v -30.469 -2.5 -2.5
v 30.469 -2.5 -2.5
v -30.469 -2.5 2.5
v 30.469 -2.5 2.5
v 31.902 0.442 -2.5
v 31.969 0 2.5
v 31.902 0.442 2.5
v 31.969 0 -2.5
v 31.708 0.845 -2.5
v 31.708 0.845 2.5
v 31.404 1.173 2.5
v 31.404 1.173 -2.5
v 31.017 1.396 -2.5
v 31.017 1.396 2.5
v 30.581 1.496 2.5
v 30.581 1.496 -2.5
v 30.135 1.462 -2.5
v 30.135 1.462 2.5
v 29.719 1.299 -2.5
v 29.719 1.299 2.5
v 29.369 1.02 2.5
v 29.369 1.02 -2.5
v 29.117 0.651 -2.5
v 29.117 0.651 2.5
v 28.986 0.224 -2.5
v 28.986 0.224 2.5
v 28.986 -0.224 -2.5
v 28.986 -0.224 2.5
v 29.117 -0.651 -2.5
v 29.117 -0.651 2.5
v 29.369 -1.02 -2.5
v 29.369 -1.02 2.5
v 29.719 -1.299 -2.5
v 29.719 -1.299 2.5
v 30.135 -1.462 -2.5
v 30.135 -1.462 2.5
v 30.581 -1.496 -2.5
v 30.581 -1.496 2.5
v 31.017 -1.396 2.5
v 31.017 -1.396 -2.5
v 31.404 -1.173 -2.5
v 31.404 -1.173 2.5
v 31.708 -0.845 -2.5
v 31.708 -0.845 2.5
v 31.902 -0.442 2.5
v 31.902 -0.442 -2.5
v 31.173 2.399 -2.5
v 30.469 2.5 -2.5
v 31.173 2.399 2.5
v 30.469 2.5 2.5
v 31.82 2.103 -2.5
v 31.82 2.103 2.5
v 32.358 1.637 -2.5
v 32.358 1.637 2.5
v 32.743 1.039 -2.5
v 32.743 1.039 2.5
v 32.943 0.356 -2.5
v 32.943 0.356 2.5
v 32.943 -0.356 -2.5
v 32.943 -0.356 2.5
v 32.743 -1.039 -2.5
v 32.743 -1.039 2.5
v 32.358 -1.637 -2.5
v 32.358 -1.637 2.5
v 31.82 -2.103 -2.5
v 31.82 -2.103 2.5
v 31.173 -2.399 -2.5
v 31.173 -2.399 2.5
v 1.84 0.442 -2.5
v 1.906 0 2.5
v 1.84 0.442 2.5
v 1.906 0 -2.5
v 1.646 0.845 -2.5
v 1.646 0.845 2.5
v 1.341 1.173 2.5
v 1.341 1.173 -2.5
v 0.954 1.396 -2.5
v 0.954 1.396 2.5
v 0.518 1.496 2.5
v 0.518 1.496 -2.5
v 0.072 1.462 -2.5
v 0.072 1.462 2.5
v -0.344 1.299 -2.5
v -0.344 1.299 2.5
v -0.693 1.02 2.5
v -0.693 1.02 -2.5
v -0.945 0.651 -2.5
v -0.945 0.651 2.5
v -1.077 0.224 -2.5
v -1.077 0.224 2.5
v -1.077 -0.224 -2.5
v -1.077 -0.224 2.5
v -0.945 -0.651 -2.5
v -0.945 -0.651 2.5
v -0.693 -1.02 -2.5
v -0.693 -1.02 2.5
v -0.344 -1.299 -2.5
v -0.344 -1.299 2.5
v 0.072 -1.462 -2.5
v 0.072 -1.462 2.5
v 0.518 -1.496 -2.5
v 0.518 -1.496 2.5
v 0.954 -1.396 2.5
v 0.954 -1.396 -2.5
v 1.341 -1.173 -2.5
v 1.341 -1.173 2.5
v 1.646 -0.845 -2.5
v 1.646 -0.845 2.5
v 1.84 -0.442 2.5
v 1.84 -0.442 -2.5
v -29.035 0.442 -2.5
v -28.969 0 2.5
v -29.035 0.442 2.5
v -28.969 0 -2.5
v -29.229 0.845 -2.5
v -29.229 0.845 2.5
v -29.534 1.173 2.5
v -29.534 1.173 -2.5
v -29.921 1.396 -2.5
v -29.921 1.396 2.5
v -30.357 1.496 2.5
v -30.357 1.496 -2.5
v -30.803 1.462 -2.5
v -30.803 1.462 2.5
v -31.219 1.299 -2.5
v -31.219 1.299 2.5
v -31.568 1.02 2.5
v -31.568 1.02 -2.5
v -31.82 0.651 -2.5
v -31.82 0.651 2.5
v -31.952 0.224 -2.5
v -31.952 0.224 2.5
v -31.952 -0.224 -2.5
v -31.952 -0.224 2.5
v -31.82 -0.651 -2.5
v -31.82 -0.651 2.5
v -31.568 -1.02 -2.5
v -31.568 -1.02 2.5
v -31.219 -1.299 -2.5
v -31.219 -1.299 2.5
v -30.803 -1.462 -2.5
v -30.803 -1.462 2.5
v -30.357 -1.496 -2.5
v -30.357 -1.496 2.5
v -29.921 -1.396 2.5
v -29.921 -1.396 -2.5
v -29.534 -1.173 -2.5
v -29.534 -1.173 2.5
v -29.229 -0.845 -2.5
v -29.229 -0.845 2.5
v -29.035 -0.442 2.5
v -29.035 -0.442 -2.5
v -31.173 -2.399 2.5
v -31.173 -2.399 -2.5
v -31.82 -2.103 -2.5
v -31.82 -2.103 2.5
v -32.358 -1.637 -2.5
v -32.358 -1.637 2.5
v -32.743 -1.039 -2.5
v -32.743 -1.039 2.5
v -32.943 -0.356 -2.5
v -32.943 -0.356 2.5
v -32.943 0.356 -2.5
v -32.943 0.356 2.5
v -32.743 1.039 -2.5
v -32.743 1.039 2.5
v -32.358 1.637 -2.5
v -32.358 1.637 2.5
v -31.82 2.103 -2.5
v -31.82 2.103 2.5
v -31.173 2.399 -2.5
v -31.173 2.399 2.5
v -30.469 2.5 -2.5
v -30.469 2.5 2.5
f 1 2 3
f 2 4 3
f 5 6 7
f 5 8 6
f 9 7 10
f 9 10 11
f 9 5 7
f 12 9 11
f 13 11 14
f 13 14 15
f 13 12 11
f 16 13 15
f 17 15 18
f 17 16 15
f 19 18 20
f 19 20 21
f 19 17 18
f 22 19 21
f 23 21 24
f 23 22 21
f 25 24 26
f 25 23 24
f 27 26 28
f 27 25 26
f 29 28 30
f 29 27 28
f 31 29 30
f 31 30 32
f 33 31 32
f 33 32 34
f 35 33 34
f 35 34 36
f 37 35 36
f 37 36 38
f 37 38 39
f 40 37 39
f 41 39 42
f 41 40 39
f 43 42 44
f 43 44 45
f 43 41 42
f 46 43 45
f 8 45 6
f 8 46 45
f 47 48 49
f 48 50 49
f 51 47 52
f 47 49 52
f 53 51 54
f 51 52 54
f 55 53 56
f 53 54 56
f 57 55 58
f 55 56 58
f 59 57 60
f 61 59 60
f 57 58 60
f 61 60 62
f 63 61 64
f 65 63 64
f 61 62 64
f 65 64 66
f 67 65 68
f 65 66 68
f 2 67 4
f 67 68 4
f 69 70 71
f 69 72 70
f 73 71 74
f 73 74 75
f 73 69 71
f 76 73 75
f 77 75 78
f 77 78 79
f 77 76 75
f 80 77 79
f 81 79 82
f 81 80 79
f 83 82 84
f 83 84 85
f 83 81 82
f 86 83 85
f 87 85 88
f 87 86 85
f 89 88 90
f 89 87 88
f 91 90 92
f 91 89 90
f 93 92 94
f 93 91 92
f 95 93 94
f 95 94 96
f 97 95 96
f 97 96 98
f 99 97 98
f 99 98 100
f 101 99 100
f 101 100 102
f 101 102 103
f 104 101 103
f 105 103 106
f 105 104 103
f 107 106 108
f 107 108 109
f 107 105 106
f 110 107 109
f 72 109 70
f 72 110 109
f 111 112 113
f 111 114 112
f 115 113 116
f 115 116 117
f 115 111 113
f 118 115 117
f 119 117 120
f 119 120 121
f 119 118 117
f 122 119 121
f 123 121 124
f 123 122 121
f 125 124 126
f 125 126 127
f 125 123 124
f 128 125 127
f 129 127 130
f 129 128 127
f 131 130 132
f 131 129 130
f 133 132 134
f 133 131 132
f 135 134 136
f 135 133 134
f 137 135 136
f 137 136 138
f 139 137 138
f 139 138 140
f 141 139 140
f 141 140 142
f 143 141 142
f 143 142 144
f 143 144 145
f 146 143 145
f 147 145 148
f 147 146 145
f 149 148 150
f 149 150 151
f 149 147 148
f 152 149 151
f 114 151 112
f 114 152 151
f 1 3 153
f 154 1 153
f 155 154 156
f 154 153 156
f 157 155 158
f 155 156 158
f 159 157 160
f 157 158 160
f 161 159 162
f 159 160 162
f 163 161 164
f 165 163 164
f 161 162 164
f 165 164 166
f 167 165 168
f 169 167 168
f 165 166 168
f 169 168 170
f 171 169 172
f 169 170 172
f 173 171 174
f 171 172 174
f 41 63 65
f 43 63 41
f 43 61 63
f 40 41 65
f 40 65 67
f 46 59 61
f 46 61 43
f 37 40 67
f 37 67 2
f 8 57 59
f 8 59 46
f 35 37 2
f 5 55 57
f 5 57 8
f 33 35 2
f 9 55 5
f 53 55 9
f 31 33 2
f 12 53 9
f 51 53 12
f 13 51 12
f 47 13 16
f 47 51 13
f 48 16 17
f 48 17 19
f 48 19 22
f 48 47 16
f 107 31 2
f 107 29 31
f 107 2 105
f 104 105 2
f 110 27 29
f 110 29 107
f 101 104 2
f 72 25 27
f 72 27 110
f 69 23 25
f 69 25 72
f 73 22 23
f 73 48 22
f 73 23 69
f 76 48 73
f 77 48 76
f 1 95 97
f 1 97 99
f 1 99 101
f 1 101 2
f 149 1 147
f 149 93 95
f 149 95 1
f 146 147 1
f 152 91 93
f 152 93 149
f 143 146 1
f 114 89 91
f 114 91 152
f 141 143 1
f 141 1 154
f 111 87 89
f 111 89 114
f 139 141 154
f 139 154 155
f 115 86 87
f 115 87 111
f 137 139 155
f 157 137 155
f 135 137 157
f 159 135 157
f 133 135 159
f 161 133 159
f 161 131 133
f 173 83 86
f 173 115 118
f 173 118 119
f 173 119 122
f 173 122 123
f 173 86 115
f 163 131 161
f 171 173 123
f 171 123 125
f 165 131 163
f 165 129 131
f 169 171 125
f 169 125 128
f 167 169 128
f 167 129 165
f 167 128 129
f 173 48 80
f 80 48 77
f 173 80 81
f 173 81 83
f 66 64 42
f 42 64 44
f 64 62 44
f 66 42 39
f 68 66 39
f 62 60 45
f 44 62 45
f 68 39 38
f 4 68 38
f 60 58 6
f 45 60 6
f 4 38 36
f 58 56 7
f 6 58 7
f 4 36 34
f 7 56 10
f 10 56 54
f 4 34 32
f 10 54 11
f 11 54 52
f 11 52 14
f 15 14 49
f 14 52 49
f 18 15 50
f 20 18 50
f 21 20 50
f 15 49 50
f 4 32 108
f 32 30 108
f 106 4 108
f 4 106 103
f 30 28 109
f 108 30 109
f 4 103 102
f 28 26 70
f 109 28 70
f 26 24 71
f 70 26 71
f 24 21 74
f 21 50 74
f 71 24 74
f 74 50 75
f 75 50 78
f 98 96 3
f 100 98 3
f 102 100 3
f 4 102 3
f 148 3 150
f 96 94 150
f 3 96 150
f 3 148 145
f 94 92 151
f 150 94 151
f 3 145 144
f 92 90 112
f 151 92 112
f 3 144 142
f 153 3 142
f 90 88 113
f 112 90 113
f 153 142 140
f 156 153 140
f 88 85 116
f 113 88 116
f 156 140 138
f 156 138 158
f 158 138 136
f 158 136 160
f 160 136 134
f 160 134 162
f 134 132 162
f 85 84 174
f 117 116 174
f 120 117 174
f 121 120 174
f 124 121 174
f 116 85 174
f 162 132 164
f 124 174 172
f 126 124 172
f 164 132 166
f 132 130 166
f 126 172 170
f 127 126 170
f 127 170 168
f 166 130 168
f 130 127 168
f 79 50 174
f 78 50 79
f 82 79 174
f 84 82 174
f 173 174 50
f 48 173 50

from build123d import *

# Parameters (mm, degrees)
SKETCH1_R           = 1.5
BOSS_EXTRUDE1_DEPTH = 2.5


with BuildPart() as part:
    # Sketch1 → Boss-Extrude1 (new, symmetric)
    with BuildSketch(Plane.XY):
        with BuildLine():
            Line((-30.46875, 2.5), (30.46875, 2.5))
            ThreePointArc((30.46875, 2.5), (32.96875, 0), (30.46875, -2.5))
            Line((30.46875, -2.5), (-30.46875, -2.5))
            ThreePointArc((-30.46875, -2.5), (-32.96875, 0), (-30.46875, 2.5))
        make_face()
        with Locations((-30.46875, 0)):
            Circle(SKETCH1_R, mode=Mode.SUBTRACT)
        with Locations((30.46875, 0)):
            Circle(SKETCH1_R, mode=Mode.SUBTRACT)
        with Locations((0.40625, 0)):
            Circle(SKETCH1_R, mode=Mode.SUBTRACT)
    extrude(amount=BOSS_EXTRUDE1_DEPTH, both=True)


solid = part.part
